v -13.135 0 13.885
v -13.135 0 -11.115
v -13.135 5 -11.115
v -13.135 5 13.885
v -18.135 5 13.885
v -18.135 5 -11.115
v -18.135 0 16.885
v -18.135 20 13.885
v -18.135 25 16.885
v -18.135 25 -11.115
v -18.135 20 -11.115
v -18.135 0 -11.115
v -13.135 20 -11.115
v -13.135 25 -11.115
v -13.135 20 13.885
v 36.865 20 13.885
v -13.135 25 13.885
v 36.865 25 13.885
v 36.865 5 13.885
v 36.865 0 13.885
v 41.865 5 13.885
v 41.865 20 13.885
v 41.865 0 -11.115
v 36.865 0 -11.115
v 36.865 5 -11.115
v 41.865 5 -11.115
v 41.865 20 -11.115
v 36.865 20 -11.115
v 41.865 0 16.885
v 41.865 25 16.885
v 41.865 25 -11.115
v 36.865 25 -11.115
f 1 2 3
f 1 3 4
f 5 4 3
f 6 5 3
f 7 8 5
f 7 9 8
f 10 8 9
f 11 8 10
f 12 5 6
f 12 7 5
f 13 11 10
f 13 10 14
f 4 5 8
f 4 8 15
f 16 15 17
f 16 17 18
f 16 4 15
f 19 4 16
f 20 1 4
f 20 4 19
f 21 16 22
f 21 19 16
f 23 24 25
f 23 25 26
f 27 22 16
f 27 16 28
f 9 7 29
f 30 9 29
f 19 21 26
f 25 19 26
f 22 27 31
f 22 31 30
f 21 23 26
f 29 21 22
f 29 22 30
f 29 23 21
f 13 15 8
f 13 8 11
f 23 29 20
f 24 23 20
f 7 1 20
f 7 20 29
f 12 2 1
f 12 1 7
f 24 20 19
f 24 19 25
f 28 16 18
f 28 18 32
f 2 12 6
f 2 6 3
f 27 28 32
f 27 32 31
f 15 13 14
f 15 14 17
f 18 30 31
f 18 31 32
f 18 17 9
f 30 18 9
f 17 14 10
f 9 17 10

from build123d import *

# Parameters (mm, degrees)
BOSS_EXTRU_1_DEPTH      = 25
ESQUISSE2_W             = 25
ESQUISSE2_H             = 15
ENL_V_MAT_EXTRU_1_DEPTH = 106


with BuildPart() as part:
    # Esquisse1 → Boss.-Extru.1 (new body)
    with BuildSketch(Plane(origin=(0, 0, 0), x_dir=(1, 0, 0), z_dir=(0, 1, 0))):
        Polygon((36.864864865, -13.885135135), (36.864864865, 11.114864865), (41.864864865, 11.114864865), (41.864864865, -16.885135135), (36.864864865, -16.885135135), (-13.135135135, -16.885135135), (-18.135135135, -16.885135135), (-18.135135135, 11.114864865), (-13.135135135, 11.114864865), (-13.135135135, -13.885135135), align=None)
    extrude(amount=BOSS_EXTRU_1_DEPTH)

    # Esquisse2 → Enlèv. mat.-Extru.1 (cut)
    with BuildSketch(Plane(origin=(41.864864865, 0, 0), x_dir=(0, 0, -1), z_dir=(1, 0, 0))):
        with Locations((-1.385135135, 12.5)):
            Rectangle(ESQUISSE2_W, ESQUISSE2_H)
    extrude(amount=-ENL_V_MAT_EXTRU_1_DEPTH, mode=Mode.SUBTRACT)


solid = part.part
